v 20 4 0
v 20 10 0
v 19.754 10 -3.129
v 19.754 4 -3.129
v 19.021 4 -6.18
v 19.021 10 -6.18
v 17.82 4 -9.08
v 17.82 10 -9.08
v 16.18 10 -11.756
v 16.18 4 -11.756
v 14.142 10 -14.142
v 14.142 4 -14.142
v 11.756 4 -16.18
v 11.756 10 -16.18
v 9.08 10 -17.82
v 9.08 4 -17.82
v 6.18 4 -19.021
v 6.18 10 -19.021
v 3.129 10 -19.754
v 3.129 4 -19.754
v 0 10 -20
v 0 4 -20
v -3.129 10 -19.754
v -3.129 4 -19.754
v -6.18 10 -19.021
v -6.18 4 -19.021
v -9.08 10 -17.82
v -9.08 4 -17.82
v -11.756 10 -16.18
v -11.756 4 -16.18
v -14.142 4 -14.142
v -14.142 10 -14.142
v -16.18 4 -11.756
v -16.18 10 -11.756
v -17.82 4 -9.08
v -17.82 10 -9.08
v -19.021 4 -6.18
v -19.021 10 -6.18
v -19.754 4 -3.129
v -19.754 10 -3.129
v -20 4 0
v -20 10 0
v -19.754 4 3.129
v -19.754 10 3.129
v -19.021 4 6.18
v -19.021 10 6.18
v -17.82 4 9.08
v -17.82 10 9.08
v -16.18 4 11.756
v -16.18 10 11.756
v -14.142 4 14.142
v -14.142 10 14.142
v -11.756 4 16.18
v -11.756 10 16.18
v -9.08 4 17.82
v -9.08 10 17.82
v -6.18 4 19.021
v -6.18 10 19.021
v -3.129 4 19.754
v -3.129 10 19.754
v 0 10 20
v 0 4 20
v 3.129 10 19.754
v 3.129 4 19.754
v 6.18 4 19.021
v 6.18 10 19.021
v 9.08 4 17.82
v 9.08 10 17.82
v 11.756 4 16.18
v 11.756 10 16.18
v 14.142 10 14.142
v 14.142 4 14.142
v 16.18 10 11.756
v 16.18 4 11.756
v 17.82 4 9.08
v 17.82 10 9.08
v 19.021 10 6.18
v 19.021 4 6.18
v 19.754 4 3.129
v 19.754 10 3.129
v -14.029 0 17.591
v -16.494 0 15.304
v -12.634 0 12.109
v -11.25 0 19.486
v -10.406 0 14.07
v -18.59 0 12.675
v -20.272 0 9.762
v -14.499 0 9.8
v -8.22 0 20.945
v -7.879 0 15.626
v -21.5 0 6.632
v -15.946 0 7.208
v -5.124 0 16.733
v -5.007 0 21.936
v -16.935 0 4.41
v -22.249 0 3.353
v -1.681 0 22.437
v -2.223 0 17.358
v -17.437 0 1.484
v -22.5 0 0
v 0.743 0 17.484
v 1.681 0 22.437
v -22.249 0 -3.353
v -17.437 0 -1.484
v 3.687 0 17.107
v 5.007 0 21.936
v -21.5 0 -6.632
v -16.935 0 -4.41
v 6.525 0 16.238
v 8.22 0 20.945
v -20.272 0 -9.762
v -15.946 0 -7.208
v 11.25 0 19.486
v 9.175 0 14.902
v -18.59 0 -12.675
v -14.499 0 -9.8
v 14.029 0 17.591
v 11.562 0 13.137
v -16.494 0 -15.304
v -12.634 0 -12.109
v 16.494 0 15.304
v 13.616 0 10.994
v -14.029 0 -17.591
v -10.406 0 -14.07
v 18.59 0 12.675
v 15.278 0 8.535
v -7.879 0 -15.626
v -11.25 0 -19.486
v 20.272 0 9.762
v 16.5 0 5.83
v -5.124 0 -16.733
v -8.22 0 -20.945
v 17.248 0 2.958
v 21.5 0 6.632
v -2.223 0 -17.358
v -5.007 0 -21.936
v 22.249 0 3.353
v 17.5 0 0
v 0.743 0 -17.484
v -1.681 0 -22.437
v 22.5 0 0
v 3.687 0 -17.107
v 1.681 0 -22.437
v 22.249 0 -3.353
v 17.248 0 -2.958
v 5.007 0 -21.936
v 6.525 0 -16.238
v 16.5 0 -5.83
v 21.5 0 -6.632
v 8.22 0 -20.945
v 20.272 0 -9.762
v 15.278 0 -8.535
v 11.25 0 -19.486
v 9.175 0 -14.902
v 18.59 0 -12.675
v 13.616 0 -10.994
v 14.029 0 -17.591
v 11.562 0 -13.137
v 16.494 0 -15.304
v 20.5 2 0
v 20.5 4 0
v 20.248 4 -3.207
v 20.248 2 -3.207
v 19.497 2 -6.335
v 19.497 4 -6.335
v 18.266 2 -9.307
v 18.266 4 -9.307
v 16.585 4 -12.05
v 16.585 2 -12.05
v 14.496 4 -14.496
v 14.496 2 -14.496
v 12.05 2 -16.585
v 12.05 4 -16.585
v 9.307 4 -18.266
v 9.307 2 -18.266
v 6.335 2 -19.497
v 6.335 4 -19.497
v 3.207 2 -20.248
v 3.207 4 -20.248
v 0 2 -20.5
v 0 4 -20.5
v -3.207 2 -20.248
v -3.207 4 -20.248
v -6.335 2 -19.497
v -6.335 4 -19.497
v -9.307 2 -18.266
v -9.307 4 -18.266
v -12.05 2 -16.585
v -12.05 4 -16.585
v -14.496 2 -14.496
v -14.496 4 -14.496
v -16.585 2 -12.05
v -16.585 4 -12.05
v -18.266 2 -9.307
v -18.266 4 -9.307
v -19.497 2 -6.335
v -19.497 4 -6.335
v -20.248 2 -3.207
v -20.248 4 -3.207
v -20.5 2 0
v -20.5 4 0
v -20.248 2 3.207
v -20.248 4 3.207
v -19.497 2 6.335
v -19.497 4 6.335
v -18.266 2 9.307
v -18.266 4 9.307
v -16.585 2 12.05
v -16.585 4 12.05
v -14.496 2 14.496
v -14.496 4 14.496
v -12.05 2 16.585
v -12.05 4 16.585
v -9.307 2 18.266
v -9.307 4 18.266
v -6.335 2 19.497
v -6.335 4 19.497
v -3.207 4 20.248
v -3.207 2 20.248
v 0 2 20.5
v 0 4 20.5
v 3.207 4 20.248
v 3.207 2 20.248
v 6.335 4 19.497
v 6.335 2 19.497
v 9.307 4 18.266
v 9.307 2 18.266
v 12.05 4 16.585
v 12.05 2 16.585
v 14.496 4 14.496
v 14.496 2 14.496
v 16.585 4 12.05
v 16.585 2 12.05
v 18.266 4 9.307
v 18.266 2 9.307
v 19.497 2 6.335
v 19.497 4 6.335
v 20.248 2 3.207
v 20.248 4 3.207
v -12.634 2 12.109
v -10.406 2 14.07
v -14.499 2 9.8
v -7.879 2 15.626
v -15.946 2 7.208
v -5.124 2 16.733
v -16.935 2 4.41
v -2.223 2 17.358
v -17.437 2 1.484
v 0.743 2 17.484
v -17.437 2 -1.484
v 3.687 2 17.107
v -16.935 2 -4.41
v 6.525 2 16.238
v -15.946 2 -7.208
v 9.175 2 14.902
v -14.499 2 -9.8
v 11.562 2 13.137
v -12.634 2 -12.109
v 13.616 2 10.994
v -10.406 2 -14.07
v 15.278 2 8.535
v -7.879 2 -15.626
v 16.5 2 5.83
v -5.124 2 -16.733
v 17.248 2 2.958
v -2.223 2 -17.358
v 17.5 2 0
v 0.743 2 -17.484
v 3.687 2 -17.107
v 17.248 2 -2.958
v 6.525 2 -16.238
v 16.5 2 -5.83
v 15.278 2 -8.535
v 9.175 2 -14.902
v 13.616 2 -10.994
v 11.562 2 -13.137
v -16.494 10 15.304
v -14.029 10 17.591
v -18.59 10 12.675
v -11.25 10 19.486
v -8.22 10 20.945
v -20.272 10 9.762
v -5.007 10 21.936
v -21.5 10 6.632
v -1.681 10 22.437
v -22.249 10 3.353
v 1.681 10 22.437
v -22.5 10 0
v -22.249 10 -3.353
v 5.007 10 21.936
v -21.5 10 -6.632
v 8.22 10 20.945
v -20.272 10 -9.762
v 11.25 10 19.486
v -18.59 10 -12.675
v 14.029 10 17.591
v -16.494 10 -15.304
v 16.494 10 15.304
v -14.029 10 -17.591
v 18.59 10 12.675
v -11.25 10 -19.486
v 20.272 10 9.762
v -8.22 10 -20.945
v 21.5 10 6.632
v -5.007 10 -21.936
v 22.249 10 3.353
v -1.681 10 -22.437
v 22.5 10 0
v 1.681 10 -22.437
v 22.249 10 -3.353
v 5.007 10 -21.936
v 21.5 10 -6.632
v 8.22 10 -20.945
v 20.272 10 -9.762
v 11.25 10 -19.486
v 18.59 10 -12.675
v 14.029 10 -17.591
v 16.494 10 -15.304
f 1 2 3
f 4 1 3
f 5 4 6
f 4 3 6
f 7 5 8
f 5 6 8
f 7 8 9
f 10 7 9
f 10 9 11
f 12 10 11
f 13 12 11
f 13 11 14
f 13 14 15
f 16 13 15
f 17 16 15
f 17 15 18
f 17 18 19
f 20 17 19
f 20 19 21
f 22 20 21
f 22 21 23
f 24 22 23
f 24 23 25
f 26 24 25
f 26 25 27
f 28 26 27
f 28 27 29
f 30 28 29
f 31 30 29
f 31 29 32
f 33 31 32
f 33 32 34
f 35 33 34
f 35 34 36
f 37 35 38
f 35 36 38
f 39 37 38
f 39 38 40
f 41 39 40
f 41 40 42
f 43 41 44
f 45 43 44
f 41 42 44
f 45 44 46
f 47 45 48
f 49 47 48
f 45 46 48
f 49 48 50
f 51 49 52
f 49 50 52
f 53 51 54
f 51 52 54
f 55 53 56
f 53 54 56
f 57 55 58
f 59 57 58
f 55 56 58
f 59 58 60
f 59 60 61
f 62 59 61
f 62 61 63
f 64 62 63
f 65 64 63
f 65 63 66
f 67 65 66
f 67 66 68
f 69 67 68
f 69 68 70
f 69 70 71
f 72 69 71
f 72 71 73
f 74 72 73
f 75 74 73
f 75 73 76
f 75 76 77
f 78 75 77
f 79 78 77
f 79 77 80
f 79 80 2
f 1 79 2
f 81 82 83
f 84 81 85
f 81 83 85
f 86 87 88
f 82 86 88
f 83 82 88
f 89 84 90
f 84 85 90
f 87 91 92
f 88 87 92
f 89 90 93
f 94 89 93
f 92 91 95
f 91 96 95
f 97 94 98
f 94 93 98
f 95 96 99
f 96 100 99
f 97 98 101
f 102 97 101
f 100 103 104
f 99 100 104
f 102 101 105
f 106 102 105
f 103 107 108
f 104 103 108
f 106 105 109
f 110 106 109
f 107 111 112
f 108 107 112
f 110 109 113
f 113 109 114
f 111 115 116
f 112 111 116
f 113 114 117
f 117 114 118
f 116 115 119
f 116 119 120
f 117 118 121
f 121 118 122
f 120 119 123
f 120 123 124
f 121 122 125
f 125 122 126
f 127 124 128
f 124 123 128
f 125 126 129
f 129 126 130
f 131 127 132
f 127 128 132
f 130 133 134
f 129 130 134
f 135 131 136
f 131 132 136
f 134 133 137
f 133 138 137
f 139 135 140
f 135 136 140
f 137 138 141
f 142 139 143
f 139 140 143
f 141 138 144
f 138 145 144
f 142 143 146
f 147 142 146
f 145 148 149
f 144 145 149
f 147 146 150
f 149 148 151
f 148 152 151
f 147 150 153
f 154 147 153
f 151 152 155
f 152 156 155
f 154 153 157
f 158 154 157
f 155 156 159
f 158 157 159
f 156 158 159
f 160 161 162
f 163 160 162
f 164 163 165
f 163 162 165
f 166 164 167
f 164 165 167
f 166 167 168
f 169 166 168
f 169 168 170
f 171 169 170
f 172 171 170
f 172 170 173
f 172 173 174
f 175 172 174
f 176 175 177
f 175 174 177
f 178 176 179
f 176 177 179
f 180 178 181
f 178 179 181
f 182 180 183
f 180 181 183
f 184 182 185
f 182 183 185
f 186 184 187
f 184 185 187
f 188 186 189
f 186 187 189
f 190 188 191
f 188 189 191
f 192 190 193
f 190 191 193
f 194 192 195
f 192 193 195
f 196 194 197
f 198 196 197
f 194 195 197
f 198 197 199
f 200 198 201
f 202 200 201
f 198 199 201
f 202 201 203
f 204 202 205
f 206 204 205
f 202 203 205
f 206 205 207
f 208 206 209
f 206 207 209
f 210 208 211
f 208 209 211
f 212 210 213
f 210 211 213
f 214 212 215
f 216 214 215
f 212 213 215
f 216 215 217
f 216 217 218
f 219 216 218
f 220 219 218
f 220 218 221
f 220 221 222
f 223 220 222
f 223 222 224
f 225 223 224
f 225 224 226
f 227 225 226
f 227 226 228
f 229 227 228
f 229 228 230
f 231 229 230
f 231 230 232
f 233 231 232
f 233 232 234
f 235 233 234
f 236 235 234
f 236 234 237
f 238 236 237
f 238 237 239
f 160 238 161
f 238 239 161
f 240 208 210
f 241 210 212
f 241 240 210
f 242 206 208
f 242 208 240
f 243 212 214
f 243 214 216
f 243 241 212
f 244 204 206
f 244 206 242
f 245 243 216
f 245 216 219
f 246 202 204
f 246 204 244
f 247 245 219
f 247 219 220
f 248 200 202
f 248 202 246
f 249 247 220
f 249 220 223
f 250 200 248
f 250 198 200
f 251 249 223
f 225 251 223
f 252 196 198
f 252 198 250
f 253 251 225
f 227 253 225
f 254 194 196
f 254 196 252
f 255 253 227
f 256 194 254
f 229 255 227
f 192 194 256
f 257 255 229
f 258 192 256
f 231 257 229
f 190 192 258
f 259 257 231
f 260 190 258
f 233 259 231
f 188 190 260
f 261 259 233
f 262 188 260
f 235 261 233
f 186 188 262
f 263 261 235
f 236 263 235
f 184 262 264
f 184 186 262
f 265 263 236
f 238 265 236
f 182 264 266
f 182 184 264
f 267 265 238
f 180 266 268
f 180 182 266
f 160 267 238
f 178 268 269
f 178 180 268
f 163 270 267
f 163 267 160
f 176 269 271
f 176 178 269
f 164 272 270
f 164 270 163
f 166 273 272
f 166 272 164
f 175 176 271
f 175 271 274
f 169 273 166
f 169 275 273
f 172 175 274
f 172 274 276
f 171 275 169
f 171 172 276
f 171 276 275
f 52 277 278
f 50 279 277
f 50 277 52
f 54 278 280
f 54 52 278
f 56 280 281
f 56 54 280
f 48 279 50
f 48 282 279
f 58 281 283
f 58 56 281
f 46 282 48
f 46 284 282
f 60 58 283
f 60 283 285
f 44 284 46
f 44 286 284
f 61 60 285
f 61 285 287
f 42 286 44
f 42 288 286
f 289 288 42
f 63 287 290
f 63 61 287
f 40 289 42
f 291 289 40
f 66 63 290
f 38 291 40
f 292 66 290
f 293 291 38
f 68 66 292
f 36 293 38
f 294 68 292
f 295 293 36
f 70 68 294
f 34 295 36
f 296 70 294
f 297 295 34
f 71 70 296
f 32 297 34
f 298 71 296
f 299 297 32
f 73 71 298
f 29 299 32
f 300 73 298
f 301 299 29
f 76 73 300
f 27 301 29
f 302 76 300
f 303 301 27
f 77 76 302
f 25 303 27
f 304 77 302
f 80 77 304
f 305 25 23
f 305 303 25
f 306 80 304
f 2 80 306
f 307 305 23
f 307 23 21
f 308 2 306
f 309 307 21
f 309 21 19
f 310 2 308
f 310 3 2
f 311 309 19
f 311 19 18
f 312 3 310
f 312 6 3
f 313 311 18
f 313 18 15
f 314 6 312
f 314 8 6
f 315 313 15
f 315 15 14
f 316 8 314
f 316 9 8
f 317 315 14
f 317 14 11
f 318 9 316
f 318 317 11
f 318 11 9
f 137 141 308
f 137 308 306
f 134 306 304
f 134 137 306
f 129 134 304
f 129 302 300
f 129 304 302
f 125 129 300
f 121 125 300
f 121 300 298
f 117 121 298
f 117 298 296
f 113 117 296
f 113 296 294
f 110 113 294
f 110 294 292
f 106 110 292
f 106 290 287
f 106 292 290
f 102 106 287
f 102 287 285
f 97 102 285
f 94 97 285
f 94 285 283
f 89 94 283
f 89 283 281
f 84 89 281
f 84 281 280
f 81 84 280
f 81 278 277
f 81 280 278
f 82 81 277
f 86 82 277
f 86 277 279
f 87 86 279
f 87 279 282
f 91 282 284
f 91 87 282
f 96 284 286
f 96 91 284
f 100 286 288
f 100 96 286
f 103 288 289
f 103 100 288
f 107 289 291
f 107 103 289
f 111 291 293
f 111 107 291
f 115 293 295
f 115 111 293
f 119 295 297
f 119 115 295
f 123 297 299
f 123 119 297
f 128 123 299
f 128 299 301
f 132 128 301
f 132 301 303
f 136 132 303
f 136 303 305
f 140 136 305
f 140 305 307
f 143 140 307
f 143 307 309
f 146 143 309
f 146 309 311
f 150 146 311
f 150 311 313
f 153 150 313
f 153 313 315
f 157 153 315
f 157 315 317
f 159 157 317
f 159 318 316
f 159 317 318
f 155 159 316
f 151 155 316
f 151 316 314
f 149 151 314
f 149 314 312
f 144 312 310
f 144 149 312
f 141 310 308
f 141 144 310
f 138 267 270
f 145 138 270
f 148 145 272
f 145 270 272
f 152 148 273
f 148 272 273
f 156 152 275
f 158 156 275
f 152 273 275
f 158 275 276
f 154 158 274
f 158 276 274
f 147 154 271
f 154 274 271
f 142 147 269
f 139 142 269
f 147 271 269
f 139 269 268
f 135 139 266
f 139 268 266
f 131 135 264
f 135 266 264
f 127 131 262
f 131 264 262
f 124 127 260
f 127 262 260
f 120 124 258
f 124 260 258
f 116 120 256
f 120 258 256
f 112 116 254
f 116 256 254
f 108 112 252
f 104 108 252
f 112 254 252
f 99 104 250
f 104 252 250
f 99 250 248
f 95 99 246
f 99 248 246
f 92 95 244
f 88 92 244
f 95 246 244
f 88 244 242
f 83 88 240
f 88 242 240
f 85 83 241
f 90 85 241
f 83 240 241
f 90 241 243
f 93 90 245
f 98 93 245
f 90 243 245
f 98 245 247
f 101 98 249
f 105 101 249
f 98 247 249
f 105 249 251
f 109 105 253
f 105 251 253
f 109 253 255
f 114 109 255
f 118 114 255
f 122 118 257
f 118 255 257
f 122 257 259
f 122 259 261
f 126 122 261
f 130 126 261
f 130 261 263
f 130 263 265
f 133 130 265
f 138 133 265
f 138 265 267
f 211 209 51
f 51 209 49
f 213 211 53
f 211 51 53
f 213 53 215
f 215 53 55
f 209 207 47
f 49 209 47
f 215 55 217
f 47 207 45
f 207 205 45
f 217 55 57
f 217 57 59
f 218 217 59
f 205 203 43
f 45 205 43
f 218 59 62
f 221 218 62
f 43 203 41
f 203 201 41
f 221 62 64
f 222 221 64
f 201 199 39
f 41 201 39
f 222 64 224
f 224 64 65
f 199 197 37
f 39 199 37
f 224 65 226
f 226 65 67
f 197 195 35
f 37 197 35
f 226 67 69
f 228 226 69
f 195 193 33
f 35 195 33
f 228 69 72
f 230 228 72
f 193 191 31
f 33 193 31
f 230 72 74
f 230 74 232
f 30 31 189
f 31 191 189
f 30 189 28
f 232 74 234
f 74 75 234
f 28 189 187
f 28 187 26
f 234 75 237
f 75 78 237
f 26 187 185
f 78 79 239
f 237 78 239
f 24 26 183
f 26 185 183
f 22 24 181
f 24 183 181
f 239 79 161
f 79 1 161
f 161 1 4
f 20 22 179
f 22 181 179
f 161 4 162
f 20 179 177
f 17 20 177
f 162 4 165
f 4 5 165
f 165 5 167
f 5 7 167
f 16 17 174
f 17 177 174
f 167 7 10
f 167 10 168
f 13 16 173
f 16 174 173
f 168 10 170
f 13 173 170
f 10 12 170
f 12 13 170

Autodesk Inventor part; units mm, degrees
ref_plane "YZ Plane" through (0, 0, 0) normal (1, 0, 0) x (0, 1, 0)
ref_plane "XZ Plane" through (0, 0, 0) normal (0, 1, 0) x (-1, 0, 0)
ref_plane "XY Plane" through (0, 0, 0) normal (0, 0, 1) x (1, 0, 0)
sketch "Sketch1" plane through (0, 0, 0) normal (0, 0, 1) x (1, 0, 0)
  line L0 (0, 0) -> (0, 8.5511) construction
  line L1 (17.5, 0) -> (17.5, 2)
  line L2 (17.5, 2) -> (20.5, 2)
  line L3 (20.5, 2) -> (20.5, 4)
  line L4 (20.5, 4) -> (20, 4)
  line L5 (20, 4) -> (20, 10)
  line L6 (20, 10) -> (22.5, 10)
  line L7 (22.5, 10) -> (22.5, 0)
  line L8 (22.5, 0) -> (17.5, 0)
  dimension "d0" = 35
  dimension "d1" = 2
  dimension "d2" = 2
  dimension "d3" = 40
  dimension "d4" = 0.5
  dimension "d5" = 6
  dimension "d6" = 45
revolve "Revolution1" add sketch "Sketch1" angle 360 about axis through (0, 0, 0) along (0, 1, 0)
thread "Thread1" size "M40x1.5" class "6H" standard "ANSI Metric M Profile" length 10
properties part number "004" material "Brass, Soft Yellow"
